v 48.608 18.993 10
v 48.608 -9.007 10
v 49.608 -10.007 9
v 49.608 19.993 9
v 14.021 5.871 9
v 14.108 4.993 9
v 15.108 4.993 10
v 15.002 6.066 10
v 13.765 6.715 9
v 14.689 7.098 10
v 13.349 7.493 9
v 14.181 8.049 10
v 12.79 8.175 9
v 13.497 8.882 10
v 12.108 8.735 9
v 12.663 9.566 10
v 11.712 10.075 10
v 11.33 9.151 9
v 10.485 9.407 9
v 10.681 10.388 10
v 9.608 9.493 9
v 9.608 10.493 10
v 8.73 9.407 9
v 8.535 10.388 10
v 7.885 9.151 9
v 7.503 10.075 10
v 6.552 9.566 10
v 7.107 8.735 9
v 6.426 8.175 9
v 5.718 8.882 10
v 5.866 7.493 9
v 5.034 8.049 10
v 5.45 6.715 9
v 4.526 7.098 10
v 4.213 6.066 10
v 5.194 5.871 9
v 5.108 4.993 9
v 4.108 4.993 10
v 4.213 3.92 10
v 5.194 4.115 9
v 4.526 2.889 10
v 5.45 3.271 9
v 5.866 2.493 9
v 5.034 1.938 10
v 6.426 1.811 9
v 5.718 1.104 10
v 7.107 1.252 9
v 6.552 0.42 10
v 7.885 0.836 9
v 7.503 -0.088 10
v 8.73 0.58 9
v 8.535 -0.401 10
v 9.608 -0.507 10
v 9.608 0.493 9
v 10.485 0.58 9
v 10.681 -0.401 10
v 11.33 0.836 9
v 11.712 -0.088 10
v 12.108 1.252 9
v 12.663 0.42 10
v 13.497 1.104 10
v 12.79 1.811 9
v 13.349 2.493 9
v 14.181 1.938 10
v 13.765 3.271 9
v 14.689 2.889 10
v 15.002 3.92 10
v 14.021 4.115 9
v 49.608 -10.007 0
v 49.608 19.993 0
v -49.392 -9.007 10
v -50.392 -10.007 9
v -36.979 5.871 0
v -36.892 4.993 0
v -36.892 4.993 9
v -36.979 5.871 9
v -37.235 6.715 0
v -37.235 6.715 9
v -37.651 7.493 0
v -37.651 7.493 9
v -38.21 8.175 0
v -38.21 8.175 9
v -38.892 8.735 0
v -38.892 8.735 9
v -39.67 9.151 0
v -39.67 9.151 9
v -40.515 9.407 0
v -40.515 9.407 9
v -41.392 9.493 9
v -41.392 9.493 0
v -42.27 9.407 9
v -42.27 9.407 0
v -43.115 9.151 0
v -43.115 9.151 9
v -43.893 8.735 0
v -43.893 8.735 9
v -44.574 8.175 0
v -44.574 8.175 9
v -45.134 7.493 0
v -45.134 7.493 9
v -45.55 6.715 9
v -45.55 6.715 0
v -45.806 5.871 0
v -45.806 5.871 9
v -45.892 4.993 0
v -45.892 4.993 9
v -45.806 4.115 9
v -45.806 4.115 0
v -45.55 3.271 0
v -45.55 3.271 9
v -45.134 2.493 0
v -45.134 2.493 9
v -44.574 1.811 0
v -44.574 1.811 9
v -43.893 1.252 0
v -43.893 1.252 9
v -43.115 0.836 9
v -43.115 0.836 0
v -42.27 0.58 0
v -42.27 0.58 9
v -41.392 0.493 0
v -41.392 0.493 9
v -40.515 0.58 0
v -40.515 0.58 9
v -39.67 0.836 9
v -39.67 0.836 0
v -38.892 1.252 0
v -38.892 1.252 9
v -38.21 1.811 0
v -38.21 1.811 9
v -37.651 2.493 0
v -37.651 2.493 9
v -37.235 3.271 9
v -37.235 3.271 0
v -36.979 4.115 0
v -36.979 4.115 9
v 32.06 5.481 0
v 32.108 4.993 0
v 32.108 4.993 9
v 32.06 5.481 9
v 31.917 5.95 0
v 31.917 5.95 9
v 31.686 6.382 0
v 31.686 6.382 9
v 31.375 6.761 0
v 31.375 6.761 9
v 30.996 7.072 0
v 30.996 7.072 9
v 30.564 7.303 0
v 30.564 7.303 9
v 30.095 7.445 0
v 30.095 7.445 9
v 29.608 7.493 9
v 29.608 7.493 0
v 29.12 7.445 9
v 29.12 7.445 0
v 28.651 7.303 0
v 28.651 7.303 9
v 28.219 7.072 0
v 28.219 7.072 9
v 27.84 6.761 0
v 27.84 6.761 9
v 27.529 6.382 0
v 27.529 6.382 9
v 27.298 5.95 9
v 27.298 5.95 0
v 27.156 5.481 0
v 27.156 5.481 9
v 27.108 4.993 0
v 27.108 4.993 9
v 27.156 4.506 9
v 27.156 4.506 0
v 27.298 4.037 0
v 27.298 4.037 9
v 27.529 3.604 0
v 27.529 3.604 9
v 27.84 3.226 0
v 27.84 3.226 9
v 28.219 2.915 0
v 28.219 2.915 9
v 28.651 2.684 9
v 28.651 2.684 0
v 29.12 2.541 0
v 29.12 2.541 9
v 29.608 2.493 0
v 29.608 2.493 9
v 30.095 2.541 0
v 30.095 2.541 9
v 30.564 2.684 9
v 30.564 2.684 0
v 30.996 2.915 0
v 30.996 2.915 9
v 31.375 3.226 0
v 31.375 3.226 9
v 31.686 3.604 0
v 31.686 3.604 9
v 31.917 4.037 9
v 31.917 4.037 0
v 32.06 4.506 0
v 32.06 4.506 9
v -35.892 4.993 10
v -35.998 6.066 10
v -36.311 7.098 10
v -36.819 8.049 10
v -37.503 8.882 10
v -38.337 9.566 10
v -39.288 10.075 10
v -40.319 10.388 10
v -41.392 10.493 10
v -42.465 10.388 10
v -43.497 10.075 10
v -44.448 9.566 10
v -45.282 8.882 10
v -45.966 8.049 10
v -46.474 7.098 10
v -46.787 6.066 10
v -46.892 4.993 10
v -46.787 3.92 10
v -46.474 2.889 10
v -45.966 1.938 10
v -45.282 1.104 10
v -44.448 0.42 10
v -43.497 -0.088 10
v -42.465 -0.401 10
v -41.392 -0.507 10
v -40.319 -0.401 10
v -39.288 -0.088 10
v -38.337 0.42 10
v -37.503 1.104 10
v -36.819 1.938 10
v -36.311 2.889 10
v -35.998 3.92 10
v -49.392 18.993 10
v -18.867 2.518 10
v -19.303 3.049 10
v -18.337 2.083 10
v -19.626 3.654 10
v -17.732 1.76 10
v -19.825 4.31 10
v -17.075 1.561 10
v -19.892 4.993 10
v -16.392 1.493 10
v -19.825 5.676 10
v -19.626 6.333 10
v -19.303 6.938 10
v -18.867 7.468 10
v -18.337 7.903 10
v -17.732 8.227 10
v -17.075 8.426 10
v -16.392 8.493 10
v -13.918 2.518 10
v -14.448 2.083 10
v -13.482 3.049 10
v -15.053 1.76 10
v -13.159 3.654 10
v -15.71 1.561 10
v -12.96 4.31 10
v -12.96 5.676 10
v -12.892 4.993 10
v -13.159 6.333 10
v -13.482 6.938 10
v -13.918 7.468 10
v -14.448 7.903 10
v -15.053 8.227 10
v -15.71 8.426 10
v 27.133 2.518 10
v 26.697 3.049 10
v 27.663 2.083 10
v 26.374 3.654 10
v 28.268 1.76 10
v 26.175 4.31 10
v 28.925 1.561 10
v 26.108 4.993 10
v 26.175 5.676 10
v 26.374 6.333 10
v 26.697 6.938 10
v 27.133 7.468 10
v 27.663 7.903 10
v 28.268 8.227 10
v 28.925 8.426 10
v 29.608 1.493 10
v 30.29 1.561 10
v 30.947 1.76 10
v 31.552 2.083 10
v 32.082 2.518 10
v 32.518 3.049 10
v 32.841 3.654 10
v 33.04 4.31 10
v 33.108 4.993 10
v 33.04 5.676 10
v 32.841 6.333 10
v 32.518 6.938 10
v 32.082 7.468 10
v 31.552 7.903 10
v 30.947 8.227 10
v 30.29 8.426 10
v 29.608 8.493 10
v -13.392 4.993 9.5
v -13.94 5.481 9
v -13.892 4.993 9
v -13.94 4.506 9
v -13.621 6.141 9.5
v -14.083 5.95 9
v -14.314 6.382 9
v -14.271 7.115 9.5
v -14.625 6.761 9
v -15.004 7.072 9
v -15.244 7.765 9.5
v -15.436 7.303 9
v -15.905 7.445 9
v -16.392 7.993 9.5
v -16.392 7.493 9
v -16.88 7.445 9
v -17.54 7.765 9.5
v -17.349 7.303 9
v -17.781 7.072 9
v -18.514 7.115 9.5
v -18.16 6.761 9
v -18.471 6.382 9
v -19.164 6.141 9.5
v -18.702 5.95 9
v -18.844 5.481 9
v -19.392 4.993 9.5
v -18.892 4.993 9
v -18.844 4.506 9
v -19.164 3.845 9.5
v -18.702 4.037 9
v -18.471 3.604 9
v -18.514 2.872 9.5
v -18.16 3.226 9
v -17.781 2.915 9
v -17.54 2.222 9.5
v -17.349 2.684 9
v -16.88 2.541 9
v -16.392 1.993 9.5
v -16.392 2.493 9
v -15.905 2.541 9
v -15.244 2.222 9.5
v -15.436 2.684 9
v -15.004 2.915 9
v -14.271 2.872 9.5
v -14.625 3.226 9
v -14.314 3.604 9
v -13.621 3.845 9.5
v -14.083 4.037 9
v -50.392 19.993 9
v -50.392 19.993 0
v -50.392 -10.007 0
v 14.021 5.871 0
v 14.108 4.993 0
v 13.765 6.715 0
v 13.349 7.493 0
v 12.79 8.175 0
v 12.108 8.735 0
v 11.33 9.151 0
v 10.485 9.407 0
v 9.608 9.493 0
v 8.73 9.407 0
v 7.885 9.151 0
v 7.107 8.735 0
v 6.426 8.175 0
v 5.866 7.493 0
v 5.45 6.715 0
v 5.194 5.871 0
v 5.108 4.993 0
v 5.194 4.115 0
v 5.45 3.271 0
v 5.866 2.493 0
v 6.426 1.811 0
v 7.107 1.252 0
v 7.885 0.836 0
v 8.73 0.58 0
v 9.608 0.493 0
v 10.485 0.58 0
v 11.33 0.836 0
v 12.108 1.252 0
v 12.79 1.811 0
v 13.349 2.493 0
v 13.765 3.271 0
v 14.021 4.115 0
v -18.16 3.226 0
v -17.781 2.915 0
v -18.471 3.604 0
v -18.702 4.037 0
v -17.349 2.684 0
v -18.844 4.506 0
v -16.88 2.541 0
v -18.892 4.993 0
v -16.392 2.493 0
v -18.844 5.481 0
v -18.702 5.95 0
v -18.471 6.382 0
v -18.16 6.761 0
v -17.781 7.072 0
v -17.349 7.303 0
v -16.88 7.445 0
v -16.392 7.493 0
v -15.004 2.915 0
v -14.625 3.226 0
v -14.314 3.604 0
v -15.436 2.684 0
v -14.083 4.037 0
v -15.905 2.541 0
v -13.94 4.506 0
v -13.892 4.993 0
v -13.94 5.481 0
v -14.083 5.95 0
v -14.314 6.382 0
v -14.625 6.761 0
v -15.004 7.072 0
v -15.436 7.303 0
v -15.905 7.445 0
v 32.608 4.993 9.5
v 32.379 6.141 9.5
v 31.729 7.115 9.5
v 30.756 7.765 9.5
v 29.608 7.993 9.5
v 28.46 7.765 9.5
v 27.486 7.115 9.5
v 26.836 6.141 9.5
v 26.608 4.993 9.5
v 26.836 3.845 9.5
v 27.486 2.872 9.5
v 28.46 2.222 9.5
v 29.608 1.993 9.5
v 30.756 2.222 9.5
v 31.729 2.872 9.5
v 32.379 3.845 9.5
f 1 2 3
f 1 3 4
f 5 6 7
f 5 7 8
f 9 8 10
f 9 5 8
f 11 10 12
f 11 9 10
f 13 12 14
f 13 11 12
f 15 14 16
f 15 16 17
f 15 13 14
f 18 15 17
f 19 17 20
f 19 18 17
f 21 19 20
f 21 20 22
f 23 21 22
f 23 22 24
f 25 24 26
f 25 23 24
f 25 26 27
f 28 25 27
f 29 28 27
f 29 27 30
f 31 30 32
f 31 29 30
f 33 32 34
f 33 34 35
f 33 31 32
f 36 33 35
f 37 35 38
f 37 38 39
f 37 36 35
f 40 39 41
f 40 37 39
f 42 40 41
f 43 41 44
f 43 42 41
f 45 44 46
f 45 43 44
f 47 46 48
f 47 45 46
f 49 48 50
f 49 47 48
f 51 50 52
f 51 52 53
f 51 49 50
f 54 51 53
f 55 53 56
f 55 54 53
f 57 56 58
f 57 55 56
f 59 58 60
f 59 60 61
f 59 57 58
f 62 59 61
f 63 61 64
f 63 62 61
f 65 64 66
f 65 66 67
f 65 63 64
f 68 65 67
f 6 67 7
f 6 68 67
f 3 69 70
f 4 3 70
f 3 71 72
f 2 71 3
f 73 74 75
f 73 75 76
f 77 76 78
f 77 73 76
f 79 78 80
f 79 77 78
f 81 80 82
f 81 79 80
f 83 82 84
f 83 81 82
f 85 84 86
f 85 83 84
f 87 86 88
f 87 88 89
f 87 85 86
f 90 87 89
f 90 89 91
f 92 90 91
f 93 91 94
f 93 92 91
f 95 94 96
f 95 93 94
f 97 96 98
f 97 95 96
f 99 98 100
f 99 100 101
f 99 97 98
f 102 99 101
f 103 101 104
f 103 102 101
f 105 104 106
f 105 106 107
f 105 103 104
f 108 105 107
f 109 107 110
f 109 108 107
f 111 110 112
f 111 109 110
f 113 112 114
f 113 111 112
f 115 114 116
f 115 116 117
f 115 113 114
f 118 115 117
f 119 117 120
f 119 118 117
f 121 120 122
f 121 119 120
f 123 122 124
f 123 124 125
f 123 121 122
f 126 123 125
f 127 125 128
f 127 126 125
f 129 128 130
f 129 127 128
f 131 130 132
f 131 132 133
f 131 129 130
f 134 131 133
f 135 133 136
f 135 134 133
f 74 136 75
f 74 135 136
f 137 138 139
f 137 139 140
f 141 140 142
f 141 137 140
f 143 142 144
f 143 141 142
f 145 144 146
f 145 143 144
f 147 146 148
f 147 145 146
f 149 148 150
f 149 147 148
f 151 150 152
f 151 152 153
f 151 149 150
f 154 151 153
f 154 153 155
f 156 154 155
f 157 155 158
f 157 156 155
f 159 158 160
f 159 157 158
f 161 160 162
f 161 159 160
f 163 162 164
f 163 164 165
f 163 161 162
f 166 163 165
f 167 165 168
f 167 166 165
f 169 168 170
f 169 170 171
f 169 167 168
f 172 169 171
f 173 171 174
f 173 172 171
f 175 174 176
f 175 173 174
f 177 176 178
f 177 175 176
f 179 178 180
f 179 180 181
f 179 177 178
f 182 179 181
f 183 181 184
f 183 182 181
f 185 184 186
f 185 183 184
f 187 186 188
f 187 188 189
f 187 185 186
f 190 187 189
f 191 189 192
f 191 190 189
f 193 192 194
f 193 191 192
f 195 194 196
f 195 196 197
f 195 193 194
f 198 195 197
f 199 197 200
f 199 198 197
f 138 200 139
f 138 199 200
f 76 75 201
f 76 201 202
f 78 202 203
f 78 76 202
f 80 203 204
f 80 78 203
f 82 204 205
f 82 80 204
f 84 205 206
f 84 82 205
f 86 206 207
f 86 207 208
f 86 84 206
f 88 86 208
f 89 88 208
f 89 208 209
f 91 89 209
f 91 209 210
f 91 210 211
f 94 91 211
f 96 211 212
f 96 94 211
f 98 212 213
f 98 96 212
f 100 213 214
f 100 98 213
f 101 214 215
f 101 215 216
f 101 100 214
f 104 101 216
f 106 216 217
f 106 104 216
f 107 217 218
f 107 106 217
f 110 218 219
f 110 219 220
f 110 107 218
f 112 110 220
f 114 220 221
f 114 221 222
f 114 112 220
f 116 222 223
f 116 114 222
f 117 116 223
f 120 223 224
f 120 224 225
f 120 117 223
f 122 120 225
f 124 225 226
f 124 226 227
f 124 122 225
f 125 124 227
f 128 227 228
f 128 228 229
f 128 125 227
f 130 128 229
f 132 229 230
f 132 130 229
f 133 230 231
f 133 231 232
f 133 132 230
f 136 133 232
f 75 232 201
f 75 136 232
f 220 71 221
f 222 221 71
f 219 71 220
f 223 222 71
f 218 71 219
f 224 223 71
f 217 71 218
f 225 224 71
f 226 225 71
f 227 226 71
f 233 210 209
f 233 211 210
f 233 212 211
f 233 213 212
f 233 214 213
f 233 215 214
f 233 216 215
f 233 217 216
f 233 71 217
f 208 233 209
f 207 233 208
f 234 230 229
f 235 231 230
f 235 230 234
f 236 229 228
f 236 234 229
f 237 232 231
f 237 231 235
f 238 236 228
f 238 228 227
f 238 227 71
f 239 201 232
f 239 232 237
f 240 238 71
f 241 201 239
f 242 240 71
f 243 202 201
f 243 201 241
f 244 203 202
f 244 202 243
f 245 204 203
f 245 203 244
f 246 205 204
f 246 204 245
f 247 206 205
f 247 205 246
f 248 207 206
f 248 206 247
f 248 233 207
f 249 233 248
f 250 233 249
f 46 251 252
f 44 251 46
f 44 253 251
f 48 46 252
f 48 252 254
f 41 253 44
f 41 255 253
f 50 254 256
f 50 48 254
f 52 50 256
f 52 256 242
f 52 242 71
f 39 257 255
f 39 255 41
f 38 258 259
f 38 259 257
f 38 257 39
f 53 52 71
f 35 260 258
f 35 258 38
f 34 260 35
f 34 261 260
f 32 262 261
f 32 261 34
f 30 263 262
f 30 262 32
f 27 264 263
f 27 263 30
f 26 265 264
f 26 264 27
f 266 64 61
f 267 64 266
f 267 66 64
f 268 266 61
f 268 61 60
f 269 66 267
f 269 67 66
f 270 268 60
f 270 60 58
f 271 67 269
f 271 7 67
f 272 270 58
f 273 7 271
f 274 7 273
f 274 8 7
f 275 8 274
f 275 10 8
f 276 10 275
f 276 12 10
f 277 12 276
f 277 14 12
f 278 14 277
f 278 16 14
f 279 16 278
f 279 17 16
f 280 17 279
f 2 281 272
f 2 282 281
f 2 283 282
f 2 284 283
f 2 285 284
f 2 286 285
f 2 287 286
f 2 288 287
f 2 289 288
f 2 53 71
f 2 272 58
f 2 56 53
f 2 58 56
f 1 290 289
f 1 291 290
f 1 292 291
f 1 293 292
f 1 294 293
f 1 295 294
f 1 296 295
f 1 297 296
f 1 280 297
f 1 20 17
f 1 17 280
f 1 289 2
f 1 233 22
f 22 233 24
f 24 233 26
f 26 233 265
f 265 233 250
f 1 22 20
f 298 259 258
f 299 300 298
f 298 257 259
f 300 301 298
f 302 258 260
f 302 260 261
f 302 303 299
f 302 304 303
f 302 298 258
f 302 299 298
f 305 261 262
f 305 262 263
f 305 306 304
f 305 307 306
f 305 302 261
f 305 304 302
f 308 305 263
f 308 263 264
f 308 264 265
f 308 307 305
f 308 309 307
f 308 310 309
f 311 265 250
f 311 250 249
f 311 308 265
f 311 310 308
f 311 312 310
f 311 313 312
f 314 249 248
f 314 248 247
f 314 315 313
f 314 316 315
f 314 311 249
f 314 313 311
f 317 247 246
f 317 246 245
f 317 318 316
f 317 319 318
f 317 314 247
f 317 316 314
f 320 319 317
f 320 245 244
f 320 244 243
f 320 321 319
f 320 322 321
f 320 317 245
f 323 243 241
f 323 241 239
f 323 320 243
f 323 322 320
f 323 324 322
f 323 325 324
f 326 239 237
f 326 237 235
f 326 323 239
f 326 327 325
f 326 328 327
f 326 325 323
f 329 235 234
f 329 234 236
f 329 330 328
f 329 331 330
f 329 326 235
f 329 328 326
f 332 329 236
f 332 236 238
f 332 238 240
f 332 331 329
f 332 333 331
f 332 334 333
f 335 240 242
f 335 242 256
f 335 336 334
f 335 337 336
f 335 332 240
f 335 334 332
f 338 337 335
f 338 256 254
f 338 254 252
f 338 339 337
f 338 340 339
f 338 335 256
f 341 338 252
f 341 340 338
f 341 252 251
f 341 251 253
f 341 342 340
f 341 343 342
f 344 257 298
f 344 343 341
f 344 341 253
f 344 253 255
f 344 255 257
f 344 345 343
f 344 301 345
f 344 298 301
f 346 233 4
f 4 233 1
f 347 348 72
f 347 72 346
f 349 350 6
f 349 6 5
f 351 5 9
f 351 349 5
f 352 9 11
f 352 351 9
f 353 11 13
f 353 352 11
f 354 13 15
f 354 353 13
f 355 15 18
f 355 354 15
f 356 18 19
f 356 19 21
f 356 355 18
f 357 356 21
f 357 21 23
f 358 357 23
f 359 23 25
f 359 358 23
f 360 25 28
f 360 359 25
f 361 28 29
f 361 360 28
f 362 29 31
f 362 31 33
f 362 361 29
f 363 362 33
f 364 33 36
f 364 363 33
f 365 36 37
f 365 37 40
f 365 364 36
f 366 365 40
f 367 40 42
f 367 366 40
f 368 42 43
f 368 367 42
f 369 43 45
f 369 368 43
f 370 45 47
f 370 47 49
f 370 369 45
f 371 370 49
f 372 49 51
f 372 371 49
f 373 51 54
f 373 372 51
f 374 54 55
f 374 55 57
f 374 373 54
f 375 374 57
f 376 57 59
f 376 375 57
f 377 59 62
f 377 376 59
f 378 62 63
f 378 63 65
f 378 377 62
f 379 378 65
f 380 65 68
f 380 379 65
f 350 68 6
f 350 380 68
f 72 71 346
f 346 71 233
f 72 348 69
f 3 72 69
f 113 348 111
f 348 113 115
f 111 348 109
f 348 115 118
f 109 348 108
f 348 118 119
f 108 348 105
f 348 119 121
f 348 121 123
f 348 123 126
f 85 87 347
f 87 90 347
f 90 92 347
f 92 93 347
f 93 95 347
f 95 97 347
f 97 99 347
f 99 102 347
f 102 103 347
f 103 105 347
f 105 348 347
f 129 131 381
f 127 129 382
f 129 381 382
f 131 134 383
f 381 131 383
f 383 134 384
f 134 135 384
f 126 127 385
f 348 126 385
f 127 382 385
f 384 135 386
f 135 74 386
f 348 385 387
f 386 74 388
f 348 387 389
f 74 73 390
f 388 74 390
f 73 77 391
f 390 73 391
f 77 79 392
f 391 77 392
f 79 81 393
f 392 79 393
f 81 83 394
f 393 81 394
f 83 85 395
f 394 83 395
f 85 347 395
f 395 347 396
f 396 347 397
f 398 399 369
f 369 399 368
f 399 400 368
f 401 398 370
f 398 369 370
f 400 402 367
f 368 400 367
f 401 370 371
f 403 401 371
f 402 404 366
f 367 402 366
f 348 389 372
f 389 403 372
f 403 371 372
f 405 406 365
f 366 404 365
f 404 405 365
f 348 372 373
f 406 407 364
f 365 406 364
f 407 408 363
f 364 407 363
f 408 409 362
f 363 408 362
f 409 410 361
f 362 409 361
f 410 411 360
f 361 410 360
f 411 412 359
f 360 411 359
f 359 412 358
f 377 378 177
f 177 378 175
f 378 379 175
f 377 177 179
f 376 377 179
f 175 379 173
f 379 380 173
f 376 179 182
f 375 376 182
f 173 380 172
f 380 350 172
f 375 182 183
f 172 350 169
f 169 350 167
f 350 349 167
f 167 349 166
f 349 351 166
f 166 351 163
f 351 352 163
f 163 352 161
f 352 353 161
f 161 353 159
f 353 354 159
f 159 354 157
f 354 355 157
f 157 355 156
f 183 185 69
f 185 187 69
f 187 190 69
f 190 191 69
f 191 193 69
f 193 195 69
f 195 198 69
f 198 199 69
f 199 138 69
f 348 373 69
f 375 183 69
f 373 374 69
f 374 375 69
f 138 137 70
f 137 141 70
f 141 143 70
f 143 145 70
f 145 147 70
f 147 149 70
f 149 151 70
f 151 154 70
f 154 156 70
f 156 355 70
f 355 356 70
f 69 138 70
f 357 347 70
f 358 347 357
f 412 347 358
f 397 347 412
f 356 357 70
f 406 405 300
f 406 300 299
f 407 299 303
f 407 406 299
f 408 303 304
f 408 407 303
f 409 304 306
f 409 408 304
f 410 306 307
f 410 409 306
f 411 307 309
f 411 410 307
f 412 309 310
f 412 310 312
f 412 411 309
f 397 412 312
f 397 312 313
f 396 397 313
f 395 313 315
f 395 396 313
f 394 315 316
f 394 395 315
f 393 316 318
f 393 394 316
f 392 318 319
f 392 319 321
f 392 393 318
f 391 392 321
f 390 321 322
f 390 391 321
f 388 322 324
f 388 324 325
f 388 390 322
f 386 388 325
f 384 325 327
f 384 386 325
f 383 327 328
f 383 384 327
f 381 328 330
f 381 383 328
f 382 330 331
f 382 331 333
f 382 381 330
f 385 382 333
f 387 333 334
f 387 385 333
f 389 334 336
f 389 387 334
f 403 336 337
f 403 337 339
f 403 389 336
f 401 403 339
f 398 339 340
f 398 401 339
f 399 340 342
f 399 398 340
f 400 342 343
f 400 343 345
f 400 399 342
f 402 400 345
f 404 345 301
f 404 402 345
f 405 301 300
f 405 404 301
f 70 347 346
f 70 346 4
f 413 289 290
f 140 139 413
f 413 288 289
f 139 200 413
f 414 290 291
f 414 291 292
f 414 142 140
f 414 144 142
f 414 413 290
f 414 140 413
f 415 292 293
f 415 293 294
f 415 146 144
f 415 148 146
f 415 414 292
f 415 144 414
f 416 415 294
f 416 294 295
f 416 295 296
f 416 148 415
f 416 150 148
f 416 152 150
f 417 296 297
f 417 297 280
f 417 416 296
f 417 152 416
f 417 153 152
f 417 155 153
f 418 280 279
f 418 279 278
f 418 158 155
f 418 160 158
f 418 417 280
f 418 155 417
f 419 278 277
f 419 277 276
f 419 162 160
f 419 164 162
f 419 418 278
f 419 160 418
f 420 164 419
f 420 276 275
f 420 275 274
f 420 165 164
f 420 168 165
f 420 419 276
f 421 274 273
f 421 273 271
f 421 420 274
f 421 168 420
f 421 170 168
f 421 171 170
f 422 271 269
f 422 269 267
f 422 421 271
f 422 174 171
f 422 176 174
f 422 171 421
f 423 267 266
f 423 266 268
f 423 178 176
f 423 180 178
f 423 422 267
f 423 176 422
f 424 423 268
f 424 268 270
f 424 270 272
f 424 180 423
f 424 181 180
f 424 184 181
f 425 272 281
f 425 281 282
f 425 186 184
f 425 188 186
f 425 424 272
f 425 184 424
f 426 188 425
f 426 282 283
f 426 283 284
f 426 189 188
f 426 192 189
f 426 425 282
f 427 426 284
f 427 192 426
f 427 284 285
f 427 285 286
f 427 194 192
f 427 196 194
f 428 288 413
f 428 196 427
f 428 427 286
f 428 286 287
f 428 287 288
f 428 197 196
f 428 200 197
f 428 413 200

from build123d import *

# Parameters (mm, degrees)
F0_W     = 100
F0_H     = 30
F0_R     = 4.5
F0_R_2   = 2.5
F1_DEPTH = 10
F2_SIZE  = 1
F3_SIZE  = 1


with BuildPart() as f1:
    # F0 (on Top) → F1 (new body)
    with BuildSketch(Plane.XY):
        with Locations((-0.392441, 4.993296)):
            Rectangle(F0_W, F0_H)
        with Locations((-41.392441, 4.993296)):
            Circle(F0_R, mode=Mode.SUBTRACT)
        with Locations((-16.392441, 4.993296)):
            Circle(F0_R_2, mode=Mode.SUBTRACT)
        with Locations((9.607559, 4.993296)):
            Circle(F0_R, mode=Mode.SUBTRACT)
        with Locations((29.607559, 4.993296)):
            Circle(F0_R_2, mode=Mode.SUBTRACT)
    extrude(amount=F1_DEPTH)

    # F2
    f2_edges = [f1.edges().sort_by_distance(p)[0] for p in [
        (-0.392441, -10.006704, 10),
        (-50.392441, 4.993296, 10),
        (-0.392441, 19.993296, 10),
        (49.607559, 4.993296, 10),
    ]]
    chamfer(f2_edges, length=F2_SIZE)

    # F3
    f3_edges = [f1.edges().sort_by_distance(p)[0] for p in [
        (-45.892441, 4.993296, 10),
        (-18.892441, 4.993296, 10),
        (5.107559, 4.993296, 10),
        (27.107559, 4.993296, 10),
    ]]
    chamfer(f3_edges, length=F3_SIZE)


solid = f1.part
